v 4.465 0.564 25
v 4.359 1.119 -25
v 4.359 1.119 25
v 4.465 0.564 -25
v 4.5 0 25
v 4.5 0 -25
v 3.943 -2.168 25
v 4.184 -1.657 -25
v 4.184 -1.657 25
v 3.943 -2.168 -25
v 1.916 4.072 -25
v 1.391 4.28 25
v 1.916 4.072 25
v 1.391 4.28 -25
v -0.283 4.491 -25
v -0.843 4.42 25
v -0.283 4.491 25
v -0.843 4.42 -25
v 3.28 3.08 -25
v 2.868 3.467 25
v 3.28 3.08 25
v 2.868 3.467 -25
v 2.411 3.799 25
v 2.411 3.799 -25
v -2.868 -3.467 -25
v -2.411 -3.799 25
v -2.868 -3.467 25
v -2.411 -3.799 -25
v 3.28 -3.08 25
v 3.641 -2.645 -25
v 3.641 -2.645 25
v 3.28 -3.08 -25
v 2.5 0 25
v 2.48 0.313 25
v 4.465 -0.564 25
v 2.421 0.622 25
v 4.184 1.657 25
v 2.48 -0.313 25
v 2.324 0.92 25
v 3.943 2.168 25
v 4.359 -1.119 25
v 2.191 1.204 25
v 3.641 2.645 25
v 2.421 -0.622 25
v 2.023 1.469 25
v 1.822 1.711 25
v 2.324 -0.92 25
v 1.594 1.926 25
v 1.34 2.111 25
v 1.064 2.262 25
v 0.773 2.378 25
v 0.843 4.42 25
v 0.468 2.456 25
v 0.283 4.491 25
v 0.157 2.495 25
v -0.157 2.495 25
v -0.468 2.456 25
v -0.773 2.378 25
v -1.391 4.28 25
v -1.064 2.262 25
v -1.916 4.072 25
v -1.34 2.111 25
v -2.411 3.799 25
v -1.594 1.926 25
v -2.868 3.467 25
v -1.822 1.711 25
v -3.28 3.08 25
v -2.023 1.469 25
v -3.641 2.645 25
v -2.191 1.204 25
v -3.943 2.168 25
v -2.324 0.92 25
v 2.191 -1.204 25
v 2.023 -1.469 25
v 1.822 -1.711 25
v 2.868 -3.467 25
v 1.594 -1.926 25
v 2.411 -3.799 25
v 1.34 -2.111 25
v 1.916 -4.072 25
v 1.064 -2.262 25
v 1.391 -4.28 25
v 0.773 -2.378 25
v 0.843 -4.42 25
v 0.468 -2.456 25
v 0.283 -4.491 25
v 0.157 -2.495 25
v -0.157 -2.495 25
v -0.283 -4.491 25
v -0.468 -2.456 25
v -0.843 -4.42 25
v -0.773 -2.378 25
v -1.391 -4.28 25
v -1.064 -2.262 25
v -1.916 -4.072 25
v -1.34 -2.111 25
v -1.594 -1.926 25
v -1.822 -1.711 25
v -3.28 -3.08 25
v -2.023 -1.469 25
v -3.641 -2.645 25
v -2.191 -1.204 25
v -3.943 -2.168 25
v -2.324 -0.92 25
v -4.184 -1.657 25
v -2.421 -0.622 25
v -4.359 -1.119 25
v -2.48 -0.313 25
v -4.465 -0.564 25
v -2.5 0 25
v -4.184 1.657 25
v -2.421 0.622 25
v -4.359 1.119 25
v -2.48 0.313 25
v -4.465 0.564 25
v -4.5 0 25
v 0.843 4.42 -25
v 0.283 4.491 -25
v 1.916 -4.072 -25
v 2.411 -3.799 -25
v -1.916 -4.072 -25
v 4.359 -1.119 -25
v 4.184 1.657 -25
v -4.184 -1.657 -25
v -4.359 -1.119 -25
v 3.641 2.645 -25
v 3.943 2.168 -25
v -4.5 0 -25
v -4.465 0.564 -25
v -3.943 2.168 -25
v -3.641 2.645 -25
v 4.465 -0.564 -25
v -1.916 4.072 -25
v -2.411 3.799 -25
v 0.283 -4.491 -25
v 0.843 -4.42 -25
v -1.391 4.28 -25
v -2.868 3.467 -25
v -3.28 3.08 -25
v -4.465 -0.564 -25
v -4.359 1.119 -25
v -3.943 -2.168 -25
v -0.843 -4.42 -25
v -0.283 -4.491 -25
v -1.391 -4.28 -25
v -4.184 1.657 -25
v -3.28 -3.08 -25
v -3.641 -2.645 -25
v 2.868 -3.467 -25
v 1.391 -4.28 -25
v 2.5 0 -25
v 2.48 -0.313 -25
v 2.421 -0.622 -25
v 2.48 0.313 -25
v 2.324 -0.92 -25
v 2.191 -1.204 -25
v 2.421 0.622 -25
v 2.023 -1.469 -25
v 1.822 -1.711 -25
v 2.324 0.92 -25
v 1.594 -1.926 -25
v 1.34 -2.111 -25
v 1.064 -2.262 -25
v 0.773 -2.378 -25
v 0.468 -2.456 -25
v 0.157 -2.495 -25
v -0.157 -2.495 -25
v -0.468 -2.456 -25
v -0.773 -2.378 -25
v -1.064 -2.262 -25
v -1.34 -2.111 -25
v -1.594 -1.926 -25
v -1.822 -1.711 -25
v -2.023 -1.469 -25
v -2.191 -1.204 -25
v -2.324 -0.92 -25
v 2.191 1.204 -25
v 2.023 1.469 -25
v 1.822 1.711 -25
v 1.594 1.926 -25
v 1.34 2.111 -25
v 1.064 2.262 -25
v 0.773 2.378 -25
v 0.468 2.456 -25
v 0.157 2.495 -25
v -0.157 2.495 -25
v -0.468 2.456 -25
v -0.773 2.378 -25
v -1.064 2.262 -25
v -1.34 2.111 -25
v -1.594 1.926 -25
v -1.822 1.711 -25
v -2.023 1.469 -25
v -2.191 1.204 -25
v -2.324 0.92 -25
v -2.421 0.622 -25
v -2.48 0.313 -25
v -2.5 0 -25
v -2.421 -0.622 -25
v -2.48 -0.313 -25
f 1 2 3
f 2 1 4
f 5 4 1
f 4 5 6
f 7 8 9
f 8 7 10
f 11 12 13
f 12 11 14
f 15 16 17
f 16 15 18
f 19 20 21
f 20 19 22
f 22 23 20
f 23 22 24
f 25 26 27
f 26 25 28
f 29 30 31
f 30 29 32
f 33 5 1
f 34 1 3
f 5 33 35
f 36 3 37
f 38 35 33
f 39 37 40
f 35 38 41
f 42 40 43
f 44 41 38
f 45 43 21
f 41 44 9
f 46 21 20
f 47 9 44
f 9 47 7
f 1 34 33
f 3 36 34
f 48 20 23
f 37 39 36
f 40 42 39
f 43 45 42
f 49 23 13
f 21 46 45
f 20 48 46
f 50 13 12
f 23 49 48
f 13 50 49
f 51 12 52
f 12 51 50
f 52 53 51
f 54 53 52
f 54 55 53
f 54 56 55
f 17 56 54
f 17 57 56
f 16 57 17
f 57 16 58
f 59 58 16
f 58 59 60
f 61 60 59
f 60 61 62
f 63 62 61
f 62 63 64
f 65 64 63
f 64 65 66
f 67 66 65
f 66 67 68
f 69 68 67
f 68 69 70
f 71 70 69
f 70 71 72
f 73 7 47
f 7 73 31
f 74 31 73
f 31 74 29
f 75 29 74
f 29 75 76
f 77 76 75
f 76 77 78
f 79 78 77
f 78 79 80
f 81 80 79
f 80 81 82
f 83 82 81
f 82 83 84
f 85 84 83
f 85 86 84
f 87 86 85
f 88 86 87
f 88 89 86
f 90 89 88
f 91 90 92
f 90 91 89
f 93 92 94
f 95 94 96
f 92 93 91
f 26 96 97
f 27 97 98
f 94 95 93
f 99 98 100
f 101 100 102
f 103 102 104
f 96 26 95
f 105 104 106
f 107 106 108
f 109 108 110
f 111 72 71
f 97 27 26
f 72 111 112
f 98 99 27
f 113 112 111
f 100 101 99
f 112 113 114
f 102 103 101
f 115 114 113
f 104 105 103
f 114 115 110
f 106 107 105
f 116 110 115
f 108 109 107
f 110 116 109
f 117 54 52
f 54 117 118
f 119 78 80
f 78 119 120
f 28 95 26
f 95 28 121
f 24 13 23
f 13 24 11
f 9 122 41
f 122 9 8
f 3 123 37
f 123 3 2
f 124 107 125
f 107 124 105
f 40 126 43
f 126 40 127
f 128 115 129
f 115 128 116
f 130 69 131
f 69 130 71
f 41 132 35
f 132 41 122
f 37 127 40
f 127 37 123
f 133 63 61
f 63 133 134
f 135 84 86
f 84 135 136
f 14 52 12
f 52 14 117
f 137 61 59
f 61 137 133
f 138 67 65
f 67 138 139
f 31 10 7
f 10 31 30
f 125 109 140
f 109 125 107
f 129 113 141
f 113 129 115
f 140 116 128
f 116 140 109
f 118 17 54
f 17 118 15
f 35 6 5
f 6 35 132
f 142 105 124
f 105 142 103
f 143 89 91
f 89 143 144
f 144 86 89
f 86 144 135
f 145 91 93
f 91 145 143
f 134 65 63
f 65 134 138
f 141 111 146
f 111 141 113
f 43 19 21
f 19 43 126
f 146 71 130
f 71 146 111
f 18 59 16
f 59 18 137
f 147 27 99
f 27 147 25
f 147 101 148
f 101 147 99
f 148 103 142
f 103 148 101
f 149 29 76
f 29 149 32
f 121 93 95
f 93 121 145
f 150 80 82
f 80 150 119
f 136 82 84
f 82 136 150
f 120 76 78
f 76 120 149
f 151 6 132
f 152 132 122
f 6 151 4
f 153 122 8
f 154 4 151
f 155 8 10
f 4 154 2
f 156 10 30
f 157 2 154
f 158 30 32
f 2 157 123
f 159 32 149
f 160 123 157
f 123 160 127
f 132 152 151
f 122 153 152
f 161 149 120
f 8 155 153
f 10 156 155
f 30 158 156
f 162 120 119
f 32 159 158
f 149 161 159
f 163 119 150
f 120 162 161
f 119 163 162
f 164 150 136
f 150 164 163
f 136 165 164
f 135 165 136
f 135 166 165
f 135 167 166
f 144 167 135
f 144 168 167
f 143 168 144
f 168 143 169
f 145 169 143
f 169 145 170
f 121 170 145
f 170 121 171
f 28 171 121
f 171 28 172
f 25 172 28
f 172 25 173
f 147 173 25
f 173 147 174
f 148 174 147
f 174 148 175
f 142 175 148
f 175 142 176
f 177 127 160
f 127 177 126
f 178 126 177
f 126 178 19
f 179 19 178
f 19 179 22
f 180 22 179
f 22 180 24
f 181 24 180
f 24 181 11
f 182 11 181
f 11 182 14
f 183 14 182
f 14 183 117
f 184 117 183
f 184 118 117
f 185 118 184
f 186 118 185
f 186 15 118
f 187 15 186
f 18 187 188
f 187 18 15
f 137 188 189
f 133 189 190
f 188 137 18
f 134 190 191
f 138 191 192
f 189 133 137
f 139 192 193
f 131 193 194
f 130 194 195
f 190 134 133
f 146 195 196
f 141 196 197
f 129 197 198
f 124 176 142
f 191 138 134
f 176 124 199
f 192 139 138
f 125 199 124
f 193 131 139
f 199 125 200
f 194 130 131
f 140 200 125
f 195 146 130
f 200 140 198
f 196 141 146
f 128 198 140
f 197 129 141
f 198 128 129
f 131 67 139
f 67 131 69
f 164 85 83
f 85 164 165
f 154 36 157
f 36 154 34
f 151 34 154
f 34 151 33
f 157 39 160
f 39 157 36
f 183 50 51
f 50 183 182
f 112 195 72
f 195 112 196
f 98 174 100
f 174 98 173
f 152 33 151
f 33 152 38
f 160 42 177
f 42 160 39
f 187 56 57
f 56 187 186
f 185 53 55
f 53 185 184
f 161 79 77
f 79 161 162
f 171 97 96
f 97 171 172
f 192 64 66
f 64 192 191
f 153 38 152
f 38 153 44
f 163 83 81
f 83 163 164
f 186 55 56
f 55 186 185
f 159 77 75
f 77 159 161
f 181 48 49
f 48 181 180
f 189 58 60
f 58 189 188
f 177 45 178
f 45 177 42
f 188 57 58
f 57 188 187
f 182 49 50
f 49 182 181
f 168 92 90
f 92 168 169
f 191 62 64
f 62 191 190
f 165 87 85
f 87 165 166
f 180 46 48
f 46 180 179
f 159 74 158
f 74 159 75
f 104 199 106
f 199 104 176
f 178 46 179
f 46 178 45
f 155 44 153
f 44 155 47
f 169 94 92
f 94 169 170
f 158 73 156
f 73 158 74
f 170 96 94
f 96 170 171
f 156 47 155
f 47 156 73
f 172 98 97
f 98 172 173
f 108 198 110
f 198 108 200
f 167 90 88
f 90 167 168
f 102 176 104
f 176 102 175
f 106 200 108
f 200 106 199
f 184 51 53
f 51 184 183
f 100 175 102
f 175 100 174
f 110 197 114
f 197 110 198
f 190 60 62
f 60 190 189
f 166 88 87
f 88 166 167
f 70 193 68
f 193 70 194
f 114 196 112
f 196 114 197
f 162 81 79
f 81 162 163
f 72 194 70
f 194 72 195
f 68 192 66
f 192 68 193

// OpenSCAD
$fn = 50;


difference() {
	union() {
		translate(v = [0, 0, -25.0000000000]) {
			cylinder(h = 50, r = 4.5000000000);
		}
	}
	union() {
		translate(v = [0, 0, -100.0000000000]) {
			cylinder(h = 200, r = 2.5000000000);
		}
	}
}
